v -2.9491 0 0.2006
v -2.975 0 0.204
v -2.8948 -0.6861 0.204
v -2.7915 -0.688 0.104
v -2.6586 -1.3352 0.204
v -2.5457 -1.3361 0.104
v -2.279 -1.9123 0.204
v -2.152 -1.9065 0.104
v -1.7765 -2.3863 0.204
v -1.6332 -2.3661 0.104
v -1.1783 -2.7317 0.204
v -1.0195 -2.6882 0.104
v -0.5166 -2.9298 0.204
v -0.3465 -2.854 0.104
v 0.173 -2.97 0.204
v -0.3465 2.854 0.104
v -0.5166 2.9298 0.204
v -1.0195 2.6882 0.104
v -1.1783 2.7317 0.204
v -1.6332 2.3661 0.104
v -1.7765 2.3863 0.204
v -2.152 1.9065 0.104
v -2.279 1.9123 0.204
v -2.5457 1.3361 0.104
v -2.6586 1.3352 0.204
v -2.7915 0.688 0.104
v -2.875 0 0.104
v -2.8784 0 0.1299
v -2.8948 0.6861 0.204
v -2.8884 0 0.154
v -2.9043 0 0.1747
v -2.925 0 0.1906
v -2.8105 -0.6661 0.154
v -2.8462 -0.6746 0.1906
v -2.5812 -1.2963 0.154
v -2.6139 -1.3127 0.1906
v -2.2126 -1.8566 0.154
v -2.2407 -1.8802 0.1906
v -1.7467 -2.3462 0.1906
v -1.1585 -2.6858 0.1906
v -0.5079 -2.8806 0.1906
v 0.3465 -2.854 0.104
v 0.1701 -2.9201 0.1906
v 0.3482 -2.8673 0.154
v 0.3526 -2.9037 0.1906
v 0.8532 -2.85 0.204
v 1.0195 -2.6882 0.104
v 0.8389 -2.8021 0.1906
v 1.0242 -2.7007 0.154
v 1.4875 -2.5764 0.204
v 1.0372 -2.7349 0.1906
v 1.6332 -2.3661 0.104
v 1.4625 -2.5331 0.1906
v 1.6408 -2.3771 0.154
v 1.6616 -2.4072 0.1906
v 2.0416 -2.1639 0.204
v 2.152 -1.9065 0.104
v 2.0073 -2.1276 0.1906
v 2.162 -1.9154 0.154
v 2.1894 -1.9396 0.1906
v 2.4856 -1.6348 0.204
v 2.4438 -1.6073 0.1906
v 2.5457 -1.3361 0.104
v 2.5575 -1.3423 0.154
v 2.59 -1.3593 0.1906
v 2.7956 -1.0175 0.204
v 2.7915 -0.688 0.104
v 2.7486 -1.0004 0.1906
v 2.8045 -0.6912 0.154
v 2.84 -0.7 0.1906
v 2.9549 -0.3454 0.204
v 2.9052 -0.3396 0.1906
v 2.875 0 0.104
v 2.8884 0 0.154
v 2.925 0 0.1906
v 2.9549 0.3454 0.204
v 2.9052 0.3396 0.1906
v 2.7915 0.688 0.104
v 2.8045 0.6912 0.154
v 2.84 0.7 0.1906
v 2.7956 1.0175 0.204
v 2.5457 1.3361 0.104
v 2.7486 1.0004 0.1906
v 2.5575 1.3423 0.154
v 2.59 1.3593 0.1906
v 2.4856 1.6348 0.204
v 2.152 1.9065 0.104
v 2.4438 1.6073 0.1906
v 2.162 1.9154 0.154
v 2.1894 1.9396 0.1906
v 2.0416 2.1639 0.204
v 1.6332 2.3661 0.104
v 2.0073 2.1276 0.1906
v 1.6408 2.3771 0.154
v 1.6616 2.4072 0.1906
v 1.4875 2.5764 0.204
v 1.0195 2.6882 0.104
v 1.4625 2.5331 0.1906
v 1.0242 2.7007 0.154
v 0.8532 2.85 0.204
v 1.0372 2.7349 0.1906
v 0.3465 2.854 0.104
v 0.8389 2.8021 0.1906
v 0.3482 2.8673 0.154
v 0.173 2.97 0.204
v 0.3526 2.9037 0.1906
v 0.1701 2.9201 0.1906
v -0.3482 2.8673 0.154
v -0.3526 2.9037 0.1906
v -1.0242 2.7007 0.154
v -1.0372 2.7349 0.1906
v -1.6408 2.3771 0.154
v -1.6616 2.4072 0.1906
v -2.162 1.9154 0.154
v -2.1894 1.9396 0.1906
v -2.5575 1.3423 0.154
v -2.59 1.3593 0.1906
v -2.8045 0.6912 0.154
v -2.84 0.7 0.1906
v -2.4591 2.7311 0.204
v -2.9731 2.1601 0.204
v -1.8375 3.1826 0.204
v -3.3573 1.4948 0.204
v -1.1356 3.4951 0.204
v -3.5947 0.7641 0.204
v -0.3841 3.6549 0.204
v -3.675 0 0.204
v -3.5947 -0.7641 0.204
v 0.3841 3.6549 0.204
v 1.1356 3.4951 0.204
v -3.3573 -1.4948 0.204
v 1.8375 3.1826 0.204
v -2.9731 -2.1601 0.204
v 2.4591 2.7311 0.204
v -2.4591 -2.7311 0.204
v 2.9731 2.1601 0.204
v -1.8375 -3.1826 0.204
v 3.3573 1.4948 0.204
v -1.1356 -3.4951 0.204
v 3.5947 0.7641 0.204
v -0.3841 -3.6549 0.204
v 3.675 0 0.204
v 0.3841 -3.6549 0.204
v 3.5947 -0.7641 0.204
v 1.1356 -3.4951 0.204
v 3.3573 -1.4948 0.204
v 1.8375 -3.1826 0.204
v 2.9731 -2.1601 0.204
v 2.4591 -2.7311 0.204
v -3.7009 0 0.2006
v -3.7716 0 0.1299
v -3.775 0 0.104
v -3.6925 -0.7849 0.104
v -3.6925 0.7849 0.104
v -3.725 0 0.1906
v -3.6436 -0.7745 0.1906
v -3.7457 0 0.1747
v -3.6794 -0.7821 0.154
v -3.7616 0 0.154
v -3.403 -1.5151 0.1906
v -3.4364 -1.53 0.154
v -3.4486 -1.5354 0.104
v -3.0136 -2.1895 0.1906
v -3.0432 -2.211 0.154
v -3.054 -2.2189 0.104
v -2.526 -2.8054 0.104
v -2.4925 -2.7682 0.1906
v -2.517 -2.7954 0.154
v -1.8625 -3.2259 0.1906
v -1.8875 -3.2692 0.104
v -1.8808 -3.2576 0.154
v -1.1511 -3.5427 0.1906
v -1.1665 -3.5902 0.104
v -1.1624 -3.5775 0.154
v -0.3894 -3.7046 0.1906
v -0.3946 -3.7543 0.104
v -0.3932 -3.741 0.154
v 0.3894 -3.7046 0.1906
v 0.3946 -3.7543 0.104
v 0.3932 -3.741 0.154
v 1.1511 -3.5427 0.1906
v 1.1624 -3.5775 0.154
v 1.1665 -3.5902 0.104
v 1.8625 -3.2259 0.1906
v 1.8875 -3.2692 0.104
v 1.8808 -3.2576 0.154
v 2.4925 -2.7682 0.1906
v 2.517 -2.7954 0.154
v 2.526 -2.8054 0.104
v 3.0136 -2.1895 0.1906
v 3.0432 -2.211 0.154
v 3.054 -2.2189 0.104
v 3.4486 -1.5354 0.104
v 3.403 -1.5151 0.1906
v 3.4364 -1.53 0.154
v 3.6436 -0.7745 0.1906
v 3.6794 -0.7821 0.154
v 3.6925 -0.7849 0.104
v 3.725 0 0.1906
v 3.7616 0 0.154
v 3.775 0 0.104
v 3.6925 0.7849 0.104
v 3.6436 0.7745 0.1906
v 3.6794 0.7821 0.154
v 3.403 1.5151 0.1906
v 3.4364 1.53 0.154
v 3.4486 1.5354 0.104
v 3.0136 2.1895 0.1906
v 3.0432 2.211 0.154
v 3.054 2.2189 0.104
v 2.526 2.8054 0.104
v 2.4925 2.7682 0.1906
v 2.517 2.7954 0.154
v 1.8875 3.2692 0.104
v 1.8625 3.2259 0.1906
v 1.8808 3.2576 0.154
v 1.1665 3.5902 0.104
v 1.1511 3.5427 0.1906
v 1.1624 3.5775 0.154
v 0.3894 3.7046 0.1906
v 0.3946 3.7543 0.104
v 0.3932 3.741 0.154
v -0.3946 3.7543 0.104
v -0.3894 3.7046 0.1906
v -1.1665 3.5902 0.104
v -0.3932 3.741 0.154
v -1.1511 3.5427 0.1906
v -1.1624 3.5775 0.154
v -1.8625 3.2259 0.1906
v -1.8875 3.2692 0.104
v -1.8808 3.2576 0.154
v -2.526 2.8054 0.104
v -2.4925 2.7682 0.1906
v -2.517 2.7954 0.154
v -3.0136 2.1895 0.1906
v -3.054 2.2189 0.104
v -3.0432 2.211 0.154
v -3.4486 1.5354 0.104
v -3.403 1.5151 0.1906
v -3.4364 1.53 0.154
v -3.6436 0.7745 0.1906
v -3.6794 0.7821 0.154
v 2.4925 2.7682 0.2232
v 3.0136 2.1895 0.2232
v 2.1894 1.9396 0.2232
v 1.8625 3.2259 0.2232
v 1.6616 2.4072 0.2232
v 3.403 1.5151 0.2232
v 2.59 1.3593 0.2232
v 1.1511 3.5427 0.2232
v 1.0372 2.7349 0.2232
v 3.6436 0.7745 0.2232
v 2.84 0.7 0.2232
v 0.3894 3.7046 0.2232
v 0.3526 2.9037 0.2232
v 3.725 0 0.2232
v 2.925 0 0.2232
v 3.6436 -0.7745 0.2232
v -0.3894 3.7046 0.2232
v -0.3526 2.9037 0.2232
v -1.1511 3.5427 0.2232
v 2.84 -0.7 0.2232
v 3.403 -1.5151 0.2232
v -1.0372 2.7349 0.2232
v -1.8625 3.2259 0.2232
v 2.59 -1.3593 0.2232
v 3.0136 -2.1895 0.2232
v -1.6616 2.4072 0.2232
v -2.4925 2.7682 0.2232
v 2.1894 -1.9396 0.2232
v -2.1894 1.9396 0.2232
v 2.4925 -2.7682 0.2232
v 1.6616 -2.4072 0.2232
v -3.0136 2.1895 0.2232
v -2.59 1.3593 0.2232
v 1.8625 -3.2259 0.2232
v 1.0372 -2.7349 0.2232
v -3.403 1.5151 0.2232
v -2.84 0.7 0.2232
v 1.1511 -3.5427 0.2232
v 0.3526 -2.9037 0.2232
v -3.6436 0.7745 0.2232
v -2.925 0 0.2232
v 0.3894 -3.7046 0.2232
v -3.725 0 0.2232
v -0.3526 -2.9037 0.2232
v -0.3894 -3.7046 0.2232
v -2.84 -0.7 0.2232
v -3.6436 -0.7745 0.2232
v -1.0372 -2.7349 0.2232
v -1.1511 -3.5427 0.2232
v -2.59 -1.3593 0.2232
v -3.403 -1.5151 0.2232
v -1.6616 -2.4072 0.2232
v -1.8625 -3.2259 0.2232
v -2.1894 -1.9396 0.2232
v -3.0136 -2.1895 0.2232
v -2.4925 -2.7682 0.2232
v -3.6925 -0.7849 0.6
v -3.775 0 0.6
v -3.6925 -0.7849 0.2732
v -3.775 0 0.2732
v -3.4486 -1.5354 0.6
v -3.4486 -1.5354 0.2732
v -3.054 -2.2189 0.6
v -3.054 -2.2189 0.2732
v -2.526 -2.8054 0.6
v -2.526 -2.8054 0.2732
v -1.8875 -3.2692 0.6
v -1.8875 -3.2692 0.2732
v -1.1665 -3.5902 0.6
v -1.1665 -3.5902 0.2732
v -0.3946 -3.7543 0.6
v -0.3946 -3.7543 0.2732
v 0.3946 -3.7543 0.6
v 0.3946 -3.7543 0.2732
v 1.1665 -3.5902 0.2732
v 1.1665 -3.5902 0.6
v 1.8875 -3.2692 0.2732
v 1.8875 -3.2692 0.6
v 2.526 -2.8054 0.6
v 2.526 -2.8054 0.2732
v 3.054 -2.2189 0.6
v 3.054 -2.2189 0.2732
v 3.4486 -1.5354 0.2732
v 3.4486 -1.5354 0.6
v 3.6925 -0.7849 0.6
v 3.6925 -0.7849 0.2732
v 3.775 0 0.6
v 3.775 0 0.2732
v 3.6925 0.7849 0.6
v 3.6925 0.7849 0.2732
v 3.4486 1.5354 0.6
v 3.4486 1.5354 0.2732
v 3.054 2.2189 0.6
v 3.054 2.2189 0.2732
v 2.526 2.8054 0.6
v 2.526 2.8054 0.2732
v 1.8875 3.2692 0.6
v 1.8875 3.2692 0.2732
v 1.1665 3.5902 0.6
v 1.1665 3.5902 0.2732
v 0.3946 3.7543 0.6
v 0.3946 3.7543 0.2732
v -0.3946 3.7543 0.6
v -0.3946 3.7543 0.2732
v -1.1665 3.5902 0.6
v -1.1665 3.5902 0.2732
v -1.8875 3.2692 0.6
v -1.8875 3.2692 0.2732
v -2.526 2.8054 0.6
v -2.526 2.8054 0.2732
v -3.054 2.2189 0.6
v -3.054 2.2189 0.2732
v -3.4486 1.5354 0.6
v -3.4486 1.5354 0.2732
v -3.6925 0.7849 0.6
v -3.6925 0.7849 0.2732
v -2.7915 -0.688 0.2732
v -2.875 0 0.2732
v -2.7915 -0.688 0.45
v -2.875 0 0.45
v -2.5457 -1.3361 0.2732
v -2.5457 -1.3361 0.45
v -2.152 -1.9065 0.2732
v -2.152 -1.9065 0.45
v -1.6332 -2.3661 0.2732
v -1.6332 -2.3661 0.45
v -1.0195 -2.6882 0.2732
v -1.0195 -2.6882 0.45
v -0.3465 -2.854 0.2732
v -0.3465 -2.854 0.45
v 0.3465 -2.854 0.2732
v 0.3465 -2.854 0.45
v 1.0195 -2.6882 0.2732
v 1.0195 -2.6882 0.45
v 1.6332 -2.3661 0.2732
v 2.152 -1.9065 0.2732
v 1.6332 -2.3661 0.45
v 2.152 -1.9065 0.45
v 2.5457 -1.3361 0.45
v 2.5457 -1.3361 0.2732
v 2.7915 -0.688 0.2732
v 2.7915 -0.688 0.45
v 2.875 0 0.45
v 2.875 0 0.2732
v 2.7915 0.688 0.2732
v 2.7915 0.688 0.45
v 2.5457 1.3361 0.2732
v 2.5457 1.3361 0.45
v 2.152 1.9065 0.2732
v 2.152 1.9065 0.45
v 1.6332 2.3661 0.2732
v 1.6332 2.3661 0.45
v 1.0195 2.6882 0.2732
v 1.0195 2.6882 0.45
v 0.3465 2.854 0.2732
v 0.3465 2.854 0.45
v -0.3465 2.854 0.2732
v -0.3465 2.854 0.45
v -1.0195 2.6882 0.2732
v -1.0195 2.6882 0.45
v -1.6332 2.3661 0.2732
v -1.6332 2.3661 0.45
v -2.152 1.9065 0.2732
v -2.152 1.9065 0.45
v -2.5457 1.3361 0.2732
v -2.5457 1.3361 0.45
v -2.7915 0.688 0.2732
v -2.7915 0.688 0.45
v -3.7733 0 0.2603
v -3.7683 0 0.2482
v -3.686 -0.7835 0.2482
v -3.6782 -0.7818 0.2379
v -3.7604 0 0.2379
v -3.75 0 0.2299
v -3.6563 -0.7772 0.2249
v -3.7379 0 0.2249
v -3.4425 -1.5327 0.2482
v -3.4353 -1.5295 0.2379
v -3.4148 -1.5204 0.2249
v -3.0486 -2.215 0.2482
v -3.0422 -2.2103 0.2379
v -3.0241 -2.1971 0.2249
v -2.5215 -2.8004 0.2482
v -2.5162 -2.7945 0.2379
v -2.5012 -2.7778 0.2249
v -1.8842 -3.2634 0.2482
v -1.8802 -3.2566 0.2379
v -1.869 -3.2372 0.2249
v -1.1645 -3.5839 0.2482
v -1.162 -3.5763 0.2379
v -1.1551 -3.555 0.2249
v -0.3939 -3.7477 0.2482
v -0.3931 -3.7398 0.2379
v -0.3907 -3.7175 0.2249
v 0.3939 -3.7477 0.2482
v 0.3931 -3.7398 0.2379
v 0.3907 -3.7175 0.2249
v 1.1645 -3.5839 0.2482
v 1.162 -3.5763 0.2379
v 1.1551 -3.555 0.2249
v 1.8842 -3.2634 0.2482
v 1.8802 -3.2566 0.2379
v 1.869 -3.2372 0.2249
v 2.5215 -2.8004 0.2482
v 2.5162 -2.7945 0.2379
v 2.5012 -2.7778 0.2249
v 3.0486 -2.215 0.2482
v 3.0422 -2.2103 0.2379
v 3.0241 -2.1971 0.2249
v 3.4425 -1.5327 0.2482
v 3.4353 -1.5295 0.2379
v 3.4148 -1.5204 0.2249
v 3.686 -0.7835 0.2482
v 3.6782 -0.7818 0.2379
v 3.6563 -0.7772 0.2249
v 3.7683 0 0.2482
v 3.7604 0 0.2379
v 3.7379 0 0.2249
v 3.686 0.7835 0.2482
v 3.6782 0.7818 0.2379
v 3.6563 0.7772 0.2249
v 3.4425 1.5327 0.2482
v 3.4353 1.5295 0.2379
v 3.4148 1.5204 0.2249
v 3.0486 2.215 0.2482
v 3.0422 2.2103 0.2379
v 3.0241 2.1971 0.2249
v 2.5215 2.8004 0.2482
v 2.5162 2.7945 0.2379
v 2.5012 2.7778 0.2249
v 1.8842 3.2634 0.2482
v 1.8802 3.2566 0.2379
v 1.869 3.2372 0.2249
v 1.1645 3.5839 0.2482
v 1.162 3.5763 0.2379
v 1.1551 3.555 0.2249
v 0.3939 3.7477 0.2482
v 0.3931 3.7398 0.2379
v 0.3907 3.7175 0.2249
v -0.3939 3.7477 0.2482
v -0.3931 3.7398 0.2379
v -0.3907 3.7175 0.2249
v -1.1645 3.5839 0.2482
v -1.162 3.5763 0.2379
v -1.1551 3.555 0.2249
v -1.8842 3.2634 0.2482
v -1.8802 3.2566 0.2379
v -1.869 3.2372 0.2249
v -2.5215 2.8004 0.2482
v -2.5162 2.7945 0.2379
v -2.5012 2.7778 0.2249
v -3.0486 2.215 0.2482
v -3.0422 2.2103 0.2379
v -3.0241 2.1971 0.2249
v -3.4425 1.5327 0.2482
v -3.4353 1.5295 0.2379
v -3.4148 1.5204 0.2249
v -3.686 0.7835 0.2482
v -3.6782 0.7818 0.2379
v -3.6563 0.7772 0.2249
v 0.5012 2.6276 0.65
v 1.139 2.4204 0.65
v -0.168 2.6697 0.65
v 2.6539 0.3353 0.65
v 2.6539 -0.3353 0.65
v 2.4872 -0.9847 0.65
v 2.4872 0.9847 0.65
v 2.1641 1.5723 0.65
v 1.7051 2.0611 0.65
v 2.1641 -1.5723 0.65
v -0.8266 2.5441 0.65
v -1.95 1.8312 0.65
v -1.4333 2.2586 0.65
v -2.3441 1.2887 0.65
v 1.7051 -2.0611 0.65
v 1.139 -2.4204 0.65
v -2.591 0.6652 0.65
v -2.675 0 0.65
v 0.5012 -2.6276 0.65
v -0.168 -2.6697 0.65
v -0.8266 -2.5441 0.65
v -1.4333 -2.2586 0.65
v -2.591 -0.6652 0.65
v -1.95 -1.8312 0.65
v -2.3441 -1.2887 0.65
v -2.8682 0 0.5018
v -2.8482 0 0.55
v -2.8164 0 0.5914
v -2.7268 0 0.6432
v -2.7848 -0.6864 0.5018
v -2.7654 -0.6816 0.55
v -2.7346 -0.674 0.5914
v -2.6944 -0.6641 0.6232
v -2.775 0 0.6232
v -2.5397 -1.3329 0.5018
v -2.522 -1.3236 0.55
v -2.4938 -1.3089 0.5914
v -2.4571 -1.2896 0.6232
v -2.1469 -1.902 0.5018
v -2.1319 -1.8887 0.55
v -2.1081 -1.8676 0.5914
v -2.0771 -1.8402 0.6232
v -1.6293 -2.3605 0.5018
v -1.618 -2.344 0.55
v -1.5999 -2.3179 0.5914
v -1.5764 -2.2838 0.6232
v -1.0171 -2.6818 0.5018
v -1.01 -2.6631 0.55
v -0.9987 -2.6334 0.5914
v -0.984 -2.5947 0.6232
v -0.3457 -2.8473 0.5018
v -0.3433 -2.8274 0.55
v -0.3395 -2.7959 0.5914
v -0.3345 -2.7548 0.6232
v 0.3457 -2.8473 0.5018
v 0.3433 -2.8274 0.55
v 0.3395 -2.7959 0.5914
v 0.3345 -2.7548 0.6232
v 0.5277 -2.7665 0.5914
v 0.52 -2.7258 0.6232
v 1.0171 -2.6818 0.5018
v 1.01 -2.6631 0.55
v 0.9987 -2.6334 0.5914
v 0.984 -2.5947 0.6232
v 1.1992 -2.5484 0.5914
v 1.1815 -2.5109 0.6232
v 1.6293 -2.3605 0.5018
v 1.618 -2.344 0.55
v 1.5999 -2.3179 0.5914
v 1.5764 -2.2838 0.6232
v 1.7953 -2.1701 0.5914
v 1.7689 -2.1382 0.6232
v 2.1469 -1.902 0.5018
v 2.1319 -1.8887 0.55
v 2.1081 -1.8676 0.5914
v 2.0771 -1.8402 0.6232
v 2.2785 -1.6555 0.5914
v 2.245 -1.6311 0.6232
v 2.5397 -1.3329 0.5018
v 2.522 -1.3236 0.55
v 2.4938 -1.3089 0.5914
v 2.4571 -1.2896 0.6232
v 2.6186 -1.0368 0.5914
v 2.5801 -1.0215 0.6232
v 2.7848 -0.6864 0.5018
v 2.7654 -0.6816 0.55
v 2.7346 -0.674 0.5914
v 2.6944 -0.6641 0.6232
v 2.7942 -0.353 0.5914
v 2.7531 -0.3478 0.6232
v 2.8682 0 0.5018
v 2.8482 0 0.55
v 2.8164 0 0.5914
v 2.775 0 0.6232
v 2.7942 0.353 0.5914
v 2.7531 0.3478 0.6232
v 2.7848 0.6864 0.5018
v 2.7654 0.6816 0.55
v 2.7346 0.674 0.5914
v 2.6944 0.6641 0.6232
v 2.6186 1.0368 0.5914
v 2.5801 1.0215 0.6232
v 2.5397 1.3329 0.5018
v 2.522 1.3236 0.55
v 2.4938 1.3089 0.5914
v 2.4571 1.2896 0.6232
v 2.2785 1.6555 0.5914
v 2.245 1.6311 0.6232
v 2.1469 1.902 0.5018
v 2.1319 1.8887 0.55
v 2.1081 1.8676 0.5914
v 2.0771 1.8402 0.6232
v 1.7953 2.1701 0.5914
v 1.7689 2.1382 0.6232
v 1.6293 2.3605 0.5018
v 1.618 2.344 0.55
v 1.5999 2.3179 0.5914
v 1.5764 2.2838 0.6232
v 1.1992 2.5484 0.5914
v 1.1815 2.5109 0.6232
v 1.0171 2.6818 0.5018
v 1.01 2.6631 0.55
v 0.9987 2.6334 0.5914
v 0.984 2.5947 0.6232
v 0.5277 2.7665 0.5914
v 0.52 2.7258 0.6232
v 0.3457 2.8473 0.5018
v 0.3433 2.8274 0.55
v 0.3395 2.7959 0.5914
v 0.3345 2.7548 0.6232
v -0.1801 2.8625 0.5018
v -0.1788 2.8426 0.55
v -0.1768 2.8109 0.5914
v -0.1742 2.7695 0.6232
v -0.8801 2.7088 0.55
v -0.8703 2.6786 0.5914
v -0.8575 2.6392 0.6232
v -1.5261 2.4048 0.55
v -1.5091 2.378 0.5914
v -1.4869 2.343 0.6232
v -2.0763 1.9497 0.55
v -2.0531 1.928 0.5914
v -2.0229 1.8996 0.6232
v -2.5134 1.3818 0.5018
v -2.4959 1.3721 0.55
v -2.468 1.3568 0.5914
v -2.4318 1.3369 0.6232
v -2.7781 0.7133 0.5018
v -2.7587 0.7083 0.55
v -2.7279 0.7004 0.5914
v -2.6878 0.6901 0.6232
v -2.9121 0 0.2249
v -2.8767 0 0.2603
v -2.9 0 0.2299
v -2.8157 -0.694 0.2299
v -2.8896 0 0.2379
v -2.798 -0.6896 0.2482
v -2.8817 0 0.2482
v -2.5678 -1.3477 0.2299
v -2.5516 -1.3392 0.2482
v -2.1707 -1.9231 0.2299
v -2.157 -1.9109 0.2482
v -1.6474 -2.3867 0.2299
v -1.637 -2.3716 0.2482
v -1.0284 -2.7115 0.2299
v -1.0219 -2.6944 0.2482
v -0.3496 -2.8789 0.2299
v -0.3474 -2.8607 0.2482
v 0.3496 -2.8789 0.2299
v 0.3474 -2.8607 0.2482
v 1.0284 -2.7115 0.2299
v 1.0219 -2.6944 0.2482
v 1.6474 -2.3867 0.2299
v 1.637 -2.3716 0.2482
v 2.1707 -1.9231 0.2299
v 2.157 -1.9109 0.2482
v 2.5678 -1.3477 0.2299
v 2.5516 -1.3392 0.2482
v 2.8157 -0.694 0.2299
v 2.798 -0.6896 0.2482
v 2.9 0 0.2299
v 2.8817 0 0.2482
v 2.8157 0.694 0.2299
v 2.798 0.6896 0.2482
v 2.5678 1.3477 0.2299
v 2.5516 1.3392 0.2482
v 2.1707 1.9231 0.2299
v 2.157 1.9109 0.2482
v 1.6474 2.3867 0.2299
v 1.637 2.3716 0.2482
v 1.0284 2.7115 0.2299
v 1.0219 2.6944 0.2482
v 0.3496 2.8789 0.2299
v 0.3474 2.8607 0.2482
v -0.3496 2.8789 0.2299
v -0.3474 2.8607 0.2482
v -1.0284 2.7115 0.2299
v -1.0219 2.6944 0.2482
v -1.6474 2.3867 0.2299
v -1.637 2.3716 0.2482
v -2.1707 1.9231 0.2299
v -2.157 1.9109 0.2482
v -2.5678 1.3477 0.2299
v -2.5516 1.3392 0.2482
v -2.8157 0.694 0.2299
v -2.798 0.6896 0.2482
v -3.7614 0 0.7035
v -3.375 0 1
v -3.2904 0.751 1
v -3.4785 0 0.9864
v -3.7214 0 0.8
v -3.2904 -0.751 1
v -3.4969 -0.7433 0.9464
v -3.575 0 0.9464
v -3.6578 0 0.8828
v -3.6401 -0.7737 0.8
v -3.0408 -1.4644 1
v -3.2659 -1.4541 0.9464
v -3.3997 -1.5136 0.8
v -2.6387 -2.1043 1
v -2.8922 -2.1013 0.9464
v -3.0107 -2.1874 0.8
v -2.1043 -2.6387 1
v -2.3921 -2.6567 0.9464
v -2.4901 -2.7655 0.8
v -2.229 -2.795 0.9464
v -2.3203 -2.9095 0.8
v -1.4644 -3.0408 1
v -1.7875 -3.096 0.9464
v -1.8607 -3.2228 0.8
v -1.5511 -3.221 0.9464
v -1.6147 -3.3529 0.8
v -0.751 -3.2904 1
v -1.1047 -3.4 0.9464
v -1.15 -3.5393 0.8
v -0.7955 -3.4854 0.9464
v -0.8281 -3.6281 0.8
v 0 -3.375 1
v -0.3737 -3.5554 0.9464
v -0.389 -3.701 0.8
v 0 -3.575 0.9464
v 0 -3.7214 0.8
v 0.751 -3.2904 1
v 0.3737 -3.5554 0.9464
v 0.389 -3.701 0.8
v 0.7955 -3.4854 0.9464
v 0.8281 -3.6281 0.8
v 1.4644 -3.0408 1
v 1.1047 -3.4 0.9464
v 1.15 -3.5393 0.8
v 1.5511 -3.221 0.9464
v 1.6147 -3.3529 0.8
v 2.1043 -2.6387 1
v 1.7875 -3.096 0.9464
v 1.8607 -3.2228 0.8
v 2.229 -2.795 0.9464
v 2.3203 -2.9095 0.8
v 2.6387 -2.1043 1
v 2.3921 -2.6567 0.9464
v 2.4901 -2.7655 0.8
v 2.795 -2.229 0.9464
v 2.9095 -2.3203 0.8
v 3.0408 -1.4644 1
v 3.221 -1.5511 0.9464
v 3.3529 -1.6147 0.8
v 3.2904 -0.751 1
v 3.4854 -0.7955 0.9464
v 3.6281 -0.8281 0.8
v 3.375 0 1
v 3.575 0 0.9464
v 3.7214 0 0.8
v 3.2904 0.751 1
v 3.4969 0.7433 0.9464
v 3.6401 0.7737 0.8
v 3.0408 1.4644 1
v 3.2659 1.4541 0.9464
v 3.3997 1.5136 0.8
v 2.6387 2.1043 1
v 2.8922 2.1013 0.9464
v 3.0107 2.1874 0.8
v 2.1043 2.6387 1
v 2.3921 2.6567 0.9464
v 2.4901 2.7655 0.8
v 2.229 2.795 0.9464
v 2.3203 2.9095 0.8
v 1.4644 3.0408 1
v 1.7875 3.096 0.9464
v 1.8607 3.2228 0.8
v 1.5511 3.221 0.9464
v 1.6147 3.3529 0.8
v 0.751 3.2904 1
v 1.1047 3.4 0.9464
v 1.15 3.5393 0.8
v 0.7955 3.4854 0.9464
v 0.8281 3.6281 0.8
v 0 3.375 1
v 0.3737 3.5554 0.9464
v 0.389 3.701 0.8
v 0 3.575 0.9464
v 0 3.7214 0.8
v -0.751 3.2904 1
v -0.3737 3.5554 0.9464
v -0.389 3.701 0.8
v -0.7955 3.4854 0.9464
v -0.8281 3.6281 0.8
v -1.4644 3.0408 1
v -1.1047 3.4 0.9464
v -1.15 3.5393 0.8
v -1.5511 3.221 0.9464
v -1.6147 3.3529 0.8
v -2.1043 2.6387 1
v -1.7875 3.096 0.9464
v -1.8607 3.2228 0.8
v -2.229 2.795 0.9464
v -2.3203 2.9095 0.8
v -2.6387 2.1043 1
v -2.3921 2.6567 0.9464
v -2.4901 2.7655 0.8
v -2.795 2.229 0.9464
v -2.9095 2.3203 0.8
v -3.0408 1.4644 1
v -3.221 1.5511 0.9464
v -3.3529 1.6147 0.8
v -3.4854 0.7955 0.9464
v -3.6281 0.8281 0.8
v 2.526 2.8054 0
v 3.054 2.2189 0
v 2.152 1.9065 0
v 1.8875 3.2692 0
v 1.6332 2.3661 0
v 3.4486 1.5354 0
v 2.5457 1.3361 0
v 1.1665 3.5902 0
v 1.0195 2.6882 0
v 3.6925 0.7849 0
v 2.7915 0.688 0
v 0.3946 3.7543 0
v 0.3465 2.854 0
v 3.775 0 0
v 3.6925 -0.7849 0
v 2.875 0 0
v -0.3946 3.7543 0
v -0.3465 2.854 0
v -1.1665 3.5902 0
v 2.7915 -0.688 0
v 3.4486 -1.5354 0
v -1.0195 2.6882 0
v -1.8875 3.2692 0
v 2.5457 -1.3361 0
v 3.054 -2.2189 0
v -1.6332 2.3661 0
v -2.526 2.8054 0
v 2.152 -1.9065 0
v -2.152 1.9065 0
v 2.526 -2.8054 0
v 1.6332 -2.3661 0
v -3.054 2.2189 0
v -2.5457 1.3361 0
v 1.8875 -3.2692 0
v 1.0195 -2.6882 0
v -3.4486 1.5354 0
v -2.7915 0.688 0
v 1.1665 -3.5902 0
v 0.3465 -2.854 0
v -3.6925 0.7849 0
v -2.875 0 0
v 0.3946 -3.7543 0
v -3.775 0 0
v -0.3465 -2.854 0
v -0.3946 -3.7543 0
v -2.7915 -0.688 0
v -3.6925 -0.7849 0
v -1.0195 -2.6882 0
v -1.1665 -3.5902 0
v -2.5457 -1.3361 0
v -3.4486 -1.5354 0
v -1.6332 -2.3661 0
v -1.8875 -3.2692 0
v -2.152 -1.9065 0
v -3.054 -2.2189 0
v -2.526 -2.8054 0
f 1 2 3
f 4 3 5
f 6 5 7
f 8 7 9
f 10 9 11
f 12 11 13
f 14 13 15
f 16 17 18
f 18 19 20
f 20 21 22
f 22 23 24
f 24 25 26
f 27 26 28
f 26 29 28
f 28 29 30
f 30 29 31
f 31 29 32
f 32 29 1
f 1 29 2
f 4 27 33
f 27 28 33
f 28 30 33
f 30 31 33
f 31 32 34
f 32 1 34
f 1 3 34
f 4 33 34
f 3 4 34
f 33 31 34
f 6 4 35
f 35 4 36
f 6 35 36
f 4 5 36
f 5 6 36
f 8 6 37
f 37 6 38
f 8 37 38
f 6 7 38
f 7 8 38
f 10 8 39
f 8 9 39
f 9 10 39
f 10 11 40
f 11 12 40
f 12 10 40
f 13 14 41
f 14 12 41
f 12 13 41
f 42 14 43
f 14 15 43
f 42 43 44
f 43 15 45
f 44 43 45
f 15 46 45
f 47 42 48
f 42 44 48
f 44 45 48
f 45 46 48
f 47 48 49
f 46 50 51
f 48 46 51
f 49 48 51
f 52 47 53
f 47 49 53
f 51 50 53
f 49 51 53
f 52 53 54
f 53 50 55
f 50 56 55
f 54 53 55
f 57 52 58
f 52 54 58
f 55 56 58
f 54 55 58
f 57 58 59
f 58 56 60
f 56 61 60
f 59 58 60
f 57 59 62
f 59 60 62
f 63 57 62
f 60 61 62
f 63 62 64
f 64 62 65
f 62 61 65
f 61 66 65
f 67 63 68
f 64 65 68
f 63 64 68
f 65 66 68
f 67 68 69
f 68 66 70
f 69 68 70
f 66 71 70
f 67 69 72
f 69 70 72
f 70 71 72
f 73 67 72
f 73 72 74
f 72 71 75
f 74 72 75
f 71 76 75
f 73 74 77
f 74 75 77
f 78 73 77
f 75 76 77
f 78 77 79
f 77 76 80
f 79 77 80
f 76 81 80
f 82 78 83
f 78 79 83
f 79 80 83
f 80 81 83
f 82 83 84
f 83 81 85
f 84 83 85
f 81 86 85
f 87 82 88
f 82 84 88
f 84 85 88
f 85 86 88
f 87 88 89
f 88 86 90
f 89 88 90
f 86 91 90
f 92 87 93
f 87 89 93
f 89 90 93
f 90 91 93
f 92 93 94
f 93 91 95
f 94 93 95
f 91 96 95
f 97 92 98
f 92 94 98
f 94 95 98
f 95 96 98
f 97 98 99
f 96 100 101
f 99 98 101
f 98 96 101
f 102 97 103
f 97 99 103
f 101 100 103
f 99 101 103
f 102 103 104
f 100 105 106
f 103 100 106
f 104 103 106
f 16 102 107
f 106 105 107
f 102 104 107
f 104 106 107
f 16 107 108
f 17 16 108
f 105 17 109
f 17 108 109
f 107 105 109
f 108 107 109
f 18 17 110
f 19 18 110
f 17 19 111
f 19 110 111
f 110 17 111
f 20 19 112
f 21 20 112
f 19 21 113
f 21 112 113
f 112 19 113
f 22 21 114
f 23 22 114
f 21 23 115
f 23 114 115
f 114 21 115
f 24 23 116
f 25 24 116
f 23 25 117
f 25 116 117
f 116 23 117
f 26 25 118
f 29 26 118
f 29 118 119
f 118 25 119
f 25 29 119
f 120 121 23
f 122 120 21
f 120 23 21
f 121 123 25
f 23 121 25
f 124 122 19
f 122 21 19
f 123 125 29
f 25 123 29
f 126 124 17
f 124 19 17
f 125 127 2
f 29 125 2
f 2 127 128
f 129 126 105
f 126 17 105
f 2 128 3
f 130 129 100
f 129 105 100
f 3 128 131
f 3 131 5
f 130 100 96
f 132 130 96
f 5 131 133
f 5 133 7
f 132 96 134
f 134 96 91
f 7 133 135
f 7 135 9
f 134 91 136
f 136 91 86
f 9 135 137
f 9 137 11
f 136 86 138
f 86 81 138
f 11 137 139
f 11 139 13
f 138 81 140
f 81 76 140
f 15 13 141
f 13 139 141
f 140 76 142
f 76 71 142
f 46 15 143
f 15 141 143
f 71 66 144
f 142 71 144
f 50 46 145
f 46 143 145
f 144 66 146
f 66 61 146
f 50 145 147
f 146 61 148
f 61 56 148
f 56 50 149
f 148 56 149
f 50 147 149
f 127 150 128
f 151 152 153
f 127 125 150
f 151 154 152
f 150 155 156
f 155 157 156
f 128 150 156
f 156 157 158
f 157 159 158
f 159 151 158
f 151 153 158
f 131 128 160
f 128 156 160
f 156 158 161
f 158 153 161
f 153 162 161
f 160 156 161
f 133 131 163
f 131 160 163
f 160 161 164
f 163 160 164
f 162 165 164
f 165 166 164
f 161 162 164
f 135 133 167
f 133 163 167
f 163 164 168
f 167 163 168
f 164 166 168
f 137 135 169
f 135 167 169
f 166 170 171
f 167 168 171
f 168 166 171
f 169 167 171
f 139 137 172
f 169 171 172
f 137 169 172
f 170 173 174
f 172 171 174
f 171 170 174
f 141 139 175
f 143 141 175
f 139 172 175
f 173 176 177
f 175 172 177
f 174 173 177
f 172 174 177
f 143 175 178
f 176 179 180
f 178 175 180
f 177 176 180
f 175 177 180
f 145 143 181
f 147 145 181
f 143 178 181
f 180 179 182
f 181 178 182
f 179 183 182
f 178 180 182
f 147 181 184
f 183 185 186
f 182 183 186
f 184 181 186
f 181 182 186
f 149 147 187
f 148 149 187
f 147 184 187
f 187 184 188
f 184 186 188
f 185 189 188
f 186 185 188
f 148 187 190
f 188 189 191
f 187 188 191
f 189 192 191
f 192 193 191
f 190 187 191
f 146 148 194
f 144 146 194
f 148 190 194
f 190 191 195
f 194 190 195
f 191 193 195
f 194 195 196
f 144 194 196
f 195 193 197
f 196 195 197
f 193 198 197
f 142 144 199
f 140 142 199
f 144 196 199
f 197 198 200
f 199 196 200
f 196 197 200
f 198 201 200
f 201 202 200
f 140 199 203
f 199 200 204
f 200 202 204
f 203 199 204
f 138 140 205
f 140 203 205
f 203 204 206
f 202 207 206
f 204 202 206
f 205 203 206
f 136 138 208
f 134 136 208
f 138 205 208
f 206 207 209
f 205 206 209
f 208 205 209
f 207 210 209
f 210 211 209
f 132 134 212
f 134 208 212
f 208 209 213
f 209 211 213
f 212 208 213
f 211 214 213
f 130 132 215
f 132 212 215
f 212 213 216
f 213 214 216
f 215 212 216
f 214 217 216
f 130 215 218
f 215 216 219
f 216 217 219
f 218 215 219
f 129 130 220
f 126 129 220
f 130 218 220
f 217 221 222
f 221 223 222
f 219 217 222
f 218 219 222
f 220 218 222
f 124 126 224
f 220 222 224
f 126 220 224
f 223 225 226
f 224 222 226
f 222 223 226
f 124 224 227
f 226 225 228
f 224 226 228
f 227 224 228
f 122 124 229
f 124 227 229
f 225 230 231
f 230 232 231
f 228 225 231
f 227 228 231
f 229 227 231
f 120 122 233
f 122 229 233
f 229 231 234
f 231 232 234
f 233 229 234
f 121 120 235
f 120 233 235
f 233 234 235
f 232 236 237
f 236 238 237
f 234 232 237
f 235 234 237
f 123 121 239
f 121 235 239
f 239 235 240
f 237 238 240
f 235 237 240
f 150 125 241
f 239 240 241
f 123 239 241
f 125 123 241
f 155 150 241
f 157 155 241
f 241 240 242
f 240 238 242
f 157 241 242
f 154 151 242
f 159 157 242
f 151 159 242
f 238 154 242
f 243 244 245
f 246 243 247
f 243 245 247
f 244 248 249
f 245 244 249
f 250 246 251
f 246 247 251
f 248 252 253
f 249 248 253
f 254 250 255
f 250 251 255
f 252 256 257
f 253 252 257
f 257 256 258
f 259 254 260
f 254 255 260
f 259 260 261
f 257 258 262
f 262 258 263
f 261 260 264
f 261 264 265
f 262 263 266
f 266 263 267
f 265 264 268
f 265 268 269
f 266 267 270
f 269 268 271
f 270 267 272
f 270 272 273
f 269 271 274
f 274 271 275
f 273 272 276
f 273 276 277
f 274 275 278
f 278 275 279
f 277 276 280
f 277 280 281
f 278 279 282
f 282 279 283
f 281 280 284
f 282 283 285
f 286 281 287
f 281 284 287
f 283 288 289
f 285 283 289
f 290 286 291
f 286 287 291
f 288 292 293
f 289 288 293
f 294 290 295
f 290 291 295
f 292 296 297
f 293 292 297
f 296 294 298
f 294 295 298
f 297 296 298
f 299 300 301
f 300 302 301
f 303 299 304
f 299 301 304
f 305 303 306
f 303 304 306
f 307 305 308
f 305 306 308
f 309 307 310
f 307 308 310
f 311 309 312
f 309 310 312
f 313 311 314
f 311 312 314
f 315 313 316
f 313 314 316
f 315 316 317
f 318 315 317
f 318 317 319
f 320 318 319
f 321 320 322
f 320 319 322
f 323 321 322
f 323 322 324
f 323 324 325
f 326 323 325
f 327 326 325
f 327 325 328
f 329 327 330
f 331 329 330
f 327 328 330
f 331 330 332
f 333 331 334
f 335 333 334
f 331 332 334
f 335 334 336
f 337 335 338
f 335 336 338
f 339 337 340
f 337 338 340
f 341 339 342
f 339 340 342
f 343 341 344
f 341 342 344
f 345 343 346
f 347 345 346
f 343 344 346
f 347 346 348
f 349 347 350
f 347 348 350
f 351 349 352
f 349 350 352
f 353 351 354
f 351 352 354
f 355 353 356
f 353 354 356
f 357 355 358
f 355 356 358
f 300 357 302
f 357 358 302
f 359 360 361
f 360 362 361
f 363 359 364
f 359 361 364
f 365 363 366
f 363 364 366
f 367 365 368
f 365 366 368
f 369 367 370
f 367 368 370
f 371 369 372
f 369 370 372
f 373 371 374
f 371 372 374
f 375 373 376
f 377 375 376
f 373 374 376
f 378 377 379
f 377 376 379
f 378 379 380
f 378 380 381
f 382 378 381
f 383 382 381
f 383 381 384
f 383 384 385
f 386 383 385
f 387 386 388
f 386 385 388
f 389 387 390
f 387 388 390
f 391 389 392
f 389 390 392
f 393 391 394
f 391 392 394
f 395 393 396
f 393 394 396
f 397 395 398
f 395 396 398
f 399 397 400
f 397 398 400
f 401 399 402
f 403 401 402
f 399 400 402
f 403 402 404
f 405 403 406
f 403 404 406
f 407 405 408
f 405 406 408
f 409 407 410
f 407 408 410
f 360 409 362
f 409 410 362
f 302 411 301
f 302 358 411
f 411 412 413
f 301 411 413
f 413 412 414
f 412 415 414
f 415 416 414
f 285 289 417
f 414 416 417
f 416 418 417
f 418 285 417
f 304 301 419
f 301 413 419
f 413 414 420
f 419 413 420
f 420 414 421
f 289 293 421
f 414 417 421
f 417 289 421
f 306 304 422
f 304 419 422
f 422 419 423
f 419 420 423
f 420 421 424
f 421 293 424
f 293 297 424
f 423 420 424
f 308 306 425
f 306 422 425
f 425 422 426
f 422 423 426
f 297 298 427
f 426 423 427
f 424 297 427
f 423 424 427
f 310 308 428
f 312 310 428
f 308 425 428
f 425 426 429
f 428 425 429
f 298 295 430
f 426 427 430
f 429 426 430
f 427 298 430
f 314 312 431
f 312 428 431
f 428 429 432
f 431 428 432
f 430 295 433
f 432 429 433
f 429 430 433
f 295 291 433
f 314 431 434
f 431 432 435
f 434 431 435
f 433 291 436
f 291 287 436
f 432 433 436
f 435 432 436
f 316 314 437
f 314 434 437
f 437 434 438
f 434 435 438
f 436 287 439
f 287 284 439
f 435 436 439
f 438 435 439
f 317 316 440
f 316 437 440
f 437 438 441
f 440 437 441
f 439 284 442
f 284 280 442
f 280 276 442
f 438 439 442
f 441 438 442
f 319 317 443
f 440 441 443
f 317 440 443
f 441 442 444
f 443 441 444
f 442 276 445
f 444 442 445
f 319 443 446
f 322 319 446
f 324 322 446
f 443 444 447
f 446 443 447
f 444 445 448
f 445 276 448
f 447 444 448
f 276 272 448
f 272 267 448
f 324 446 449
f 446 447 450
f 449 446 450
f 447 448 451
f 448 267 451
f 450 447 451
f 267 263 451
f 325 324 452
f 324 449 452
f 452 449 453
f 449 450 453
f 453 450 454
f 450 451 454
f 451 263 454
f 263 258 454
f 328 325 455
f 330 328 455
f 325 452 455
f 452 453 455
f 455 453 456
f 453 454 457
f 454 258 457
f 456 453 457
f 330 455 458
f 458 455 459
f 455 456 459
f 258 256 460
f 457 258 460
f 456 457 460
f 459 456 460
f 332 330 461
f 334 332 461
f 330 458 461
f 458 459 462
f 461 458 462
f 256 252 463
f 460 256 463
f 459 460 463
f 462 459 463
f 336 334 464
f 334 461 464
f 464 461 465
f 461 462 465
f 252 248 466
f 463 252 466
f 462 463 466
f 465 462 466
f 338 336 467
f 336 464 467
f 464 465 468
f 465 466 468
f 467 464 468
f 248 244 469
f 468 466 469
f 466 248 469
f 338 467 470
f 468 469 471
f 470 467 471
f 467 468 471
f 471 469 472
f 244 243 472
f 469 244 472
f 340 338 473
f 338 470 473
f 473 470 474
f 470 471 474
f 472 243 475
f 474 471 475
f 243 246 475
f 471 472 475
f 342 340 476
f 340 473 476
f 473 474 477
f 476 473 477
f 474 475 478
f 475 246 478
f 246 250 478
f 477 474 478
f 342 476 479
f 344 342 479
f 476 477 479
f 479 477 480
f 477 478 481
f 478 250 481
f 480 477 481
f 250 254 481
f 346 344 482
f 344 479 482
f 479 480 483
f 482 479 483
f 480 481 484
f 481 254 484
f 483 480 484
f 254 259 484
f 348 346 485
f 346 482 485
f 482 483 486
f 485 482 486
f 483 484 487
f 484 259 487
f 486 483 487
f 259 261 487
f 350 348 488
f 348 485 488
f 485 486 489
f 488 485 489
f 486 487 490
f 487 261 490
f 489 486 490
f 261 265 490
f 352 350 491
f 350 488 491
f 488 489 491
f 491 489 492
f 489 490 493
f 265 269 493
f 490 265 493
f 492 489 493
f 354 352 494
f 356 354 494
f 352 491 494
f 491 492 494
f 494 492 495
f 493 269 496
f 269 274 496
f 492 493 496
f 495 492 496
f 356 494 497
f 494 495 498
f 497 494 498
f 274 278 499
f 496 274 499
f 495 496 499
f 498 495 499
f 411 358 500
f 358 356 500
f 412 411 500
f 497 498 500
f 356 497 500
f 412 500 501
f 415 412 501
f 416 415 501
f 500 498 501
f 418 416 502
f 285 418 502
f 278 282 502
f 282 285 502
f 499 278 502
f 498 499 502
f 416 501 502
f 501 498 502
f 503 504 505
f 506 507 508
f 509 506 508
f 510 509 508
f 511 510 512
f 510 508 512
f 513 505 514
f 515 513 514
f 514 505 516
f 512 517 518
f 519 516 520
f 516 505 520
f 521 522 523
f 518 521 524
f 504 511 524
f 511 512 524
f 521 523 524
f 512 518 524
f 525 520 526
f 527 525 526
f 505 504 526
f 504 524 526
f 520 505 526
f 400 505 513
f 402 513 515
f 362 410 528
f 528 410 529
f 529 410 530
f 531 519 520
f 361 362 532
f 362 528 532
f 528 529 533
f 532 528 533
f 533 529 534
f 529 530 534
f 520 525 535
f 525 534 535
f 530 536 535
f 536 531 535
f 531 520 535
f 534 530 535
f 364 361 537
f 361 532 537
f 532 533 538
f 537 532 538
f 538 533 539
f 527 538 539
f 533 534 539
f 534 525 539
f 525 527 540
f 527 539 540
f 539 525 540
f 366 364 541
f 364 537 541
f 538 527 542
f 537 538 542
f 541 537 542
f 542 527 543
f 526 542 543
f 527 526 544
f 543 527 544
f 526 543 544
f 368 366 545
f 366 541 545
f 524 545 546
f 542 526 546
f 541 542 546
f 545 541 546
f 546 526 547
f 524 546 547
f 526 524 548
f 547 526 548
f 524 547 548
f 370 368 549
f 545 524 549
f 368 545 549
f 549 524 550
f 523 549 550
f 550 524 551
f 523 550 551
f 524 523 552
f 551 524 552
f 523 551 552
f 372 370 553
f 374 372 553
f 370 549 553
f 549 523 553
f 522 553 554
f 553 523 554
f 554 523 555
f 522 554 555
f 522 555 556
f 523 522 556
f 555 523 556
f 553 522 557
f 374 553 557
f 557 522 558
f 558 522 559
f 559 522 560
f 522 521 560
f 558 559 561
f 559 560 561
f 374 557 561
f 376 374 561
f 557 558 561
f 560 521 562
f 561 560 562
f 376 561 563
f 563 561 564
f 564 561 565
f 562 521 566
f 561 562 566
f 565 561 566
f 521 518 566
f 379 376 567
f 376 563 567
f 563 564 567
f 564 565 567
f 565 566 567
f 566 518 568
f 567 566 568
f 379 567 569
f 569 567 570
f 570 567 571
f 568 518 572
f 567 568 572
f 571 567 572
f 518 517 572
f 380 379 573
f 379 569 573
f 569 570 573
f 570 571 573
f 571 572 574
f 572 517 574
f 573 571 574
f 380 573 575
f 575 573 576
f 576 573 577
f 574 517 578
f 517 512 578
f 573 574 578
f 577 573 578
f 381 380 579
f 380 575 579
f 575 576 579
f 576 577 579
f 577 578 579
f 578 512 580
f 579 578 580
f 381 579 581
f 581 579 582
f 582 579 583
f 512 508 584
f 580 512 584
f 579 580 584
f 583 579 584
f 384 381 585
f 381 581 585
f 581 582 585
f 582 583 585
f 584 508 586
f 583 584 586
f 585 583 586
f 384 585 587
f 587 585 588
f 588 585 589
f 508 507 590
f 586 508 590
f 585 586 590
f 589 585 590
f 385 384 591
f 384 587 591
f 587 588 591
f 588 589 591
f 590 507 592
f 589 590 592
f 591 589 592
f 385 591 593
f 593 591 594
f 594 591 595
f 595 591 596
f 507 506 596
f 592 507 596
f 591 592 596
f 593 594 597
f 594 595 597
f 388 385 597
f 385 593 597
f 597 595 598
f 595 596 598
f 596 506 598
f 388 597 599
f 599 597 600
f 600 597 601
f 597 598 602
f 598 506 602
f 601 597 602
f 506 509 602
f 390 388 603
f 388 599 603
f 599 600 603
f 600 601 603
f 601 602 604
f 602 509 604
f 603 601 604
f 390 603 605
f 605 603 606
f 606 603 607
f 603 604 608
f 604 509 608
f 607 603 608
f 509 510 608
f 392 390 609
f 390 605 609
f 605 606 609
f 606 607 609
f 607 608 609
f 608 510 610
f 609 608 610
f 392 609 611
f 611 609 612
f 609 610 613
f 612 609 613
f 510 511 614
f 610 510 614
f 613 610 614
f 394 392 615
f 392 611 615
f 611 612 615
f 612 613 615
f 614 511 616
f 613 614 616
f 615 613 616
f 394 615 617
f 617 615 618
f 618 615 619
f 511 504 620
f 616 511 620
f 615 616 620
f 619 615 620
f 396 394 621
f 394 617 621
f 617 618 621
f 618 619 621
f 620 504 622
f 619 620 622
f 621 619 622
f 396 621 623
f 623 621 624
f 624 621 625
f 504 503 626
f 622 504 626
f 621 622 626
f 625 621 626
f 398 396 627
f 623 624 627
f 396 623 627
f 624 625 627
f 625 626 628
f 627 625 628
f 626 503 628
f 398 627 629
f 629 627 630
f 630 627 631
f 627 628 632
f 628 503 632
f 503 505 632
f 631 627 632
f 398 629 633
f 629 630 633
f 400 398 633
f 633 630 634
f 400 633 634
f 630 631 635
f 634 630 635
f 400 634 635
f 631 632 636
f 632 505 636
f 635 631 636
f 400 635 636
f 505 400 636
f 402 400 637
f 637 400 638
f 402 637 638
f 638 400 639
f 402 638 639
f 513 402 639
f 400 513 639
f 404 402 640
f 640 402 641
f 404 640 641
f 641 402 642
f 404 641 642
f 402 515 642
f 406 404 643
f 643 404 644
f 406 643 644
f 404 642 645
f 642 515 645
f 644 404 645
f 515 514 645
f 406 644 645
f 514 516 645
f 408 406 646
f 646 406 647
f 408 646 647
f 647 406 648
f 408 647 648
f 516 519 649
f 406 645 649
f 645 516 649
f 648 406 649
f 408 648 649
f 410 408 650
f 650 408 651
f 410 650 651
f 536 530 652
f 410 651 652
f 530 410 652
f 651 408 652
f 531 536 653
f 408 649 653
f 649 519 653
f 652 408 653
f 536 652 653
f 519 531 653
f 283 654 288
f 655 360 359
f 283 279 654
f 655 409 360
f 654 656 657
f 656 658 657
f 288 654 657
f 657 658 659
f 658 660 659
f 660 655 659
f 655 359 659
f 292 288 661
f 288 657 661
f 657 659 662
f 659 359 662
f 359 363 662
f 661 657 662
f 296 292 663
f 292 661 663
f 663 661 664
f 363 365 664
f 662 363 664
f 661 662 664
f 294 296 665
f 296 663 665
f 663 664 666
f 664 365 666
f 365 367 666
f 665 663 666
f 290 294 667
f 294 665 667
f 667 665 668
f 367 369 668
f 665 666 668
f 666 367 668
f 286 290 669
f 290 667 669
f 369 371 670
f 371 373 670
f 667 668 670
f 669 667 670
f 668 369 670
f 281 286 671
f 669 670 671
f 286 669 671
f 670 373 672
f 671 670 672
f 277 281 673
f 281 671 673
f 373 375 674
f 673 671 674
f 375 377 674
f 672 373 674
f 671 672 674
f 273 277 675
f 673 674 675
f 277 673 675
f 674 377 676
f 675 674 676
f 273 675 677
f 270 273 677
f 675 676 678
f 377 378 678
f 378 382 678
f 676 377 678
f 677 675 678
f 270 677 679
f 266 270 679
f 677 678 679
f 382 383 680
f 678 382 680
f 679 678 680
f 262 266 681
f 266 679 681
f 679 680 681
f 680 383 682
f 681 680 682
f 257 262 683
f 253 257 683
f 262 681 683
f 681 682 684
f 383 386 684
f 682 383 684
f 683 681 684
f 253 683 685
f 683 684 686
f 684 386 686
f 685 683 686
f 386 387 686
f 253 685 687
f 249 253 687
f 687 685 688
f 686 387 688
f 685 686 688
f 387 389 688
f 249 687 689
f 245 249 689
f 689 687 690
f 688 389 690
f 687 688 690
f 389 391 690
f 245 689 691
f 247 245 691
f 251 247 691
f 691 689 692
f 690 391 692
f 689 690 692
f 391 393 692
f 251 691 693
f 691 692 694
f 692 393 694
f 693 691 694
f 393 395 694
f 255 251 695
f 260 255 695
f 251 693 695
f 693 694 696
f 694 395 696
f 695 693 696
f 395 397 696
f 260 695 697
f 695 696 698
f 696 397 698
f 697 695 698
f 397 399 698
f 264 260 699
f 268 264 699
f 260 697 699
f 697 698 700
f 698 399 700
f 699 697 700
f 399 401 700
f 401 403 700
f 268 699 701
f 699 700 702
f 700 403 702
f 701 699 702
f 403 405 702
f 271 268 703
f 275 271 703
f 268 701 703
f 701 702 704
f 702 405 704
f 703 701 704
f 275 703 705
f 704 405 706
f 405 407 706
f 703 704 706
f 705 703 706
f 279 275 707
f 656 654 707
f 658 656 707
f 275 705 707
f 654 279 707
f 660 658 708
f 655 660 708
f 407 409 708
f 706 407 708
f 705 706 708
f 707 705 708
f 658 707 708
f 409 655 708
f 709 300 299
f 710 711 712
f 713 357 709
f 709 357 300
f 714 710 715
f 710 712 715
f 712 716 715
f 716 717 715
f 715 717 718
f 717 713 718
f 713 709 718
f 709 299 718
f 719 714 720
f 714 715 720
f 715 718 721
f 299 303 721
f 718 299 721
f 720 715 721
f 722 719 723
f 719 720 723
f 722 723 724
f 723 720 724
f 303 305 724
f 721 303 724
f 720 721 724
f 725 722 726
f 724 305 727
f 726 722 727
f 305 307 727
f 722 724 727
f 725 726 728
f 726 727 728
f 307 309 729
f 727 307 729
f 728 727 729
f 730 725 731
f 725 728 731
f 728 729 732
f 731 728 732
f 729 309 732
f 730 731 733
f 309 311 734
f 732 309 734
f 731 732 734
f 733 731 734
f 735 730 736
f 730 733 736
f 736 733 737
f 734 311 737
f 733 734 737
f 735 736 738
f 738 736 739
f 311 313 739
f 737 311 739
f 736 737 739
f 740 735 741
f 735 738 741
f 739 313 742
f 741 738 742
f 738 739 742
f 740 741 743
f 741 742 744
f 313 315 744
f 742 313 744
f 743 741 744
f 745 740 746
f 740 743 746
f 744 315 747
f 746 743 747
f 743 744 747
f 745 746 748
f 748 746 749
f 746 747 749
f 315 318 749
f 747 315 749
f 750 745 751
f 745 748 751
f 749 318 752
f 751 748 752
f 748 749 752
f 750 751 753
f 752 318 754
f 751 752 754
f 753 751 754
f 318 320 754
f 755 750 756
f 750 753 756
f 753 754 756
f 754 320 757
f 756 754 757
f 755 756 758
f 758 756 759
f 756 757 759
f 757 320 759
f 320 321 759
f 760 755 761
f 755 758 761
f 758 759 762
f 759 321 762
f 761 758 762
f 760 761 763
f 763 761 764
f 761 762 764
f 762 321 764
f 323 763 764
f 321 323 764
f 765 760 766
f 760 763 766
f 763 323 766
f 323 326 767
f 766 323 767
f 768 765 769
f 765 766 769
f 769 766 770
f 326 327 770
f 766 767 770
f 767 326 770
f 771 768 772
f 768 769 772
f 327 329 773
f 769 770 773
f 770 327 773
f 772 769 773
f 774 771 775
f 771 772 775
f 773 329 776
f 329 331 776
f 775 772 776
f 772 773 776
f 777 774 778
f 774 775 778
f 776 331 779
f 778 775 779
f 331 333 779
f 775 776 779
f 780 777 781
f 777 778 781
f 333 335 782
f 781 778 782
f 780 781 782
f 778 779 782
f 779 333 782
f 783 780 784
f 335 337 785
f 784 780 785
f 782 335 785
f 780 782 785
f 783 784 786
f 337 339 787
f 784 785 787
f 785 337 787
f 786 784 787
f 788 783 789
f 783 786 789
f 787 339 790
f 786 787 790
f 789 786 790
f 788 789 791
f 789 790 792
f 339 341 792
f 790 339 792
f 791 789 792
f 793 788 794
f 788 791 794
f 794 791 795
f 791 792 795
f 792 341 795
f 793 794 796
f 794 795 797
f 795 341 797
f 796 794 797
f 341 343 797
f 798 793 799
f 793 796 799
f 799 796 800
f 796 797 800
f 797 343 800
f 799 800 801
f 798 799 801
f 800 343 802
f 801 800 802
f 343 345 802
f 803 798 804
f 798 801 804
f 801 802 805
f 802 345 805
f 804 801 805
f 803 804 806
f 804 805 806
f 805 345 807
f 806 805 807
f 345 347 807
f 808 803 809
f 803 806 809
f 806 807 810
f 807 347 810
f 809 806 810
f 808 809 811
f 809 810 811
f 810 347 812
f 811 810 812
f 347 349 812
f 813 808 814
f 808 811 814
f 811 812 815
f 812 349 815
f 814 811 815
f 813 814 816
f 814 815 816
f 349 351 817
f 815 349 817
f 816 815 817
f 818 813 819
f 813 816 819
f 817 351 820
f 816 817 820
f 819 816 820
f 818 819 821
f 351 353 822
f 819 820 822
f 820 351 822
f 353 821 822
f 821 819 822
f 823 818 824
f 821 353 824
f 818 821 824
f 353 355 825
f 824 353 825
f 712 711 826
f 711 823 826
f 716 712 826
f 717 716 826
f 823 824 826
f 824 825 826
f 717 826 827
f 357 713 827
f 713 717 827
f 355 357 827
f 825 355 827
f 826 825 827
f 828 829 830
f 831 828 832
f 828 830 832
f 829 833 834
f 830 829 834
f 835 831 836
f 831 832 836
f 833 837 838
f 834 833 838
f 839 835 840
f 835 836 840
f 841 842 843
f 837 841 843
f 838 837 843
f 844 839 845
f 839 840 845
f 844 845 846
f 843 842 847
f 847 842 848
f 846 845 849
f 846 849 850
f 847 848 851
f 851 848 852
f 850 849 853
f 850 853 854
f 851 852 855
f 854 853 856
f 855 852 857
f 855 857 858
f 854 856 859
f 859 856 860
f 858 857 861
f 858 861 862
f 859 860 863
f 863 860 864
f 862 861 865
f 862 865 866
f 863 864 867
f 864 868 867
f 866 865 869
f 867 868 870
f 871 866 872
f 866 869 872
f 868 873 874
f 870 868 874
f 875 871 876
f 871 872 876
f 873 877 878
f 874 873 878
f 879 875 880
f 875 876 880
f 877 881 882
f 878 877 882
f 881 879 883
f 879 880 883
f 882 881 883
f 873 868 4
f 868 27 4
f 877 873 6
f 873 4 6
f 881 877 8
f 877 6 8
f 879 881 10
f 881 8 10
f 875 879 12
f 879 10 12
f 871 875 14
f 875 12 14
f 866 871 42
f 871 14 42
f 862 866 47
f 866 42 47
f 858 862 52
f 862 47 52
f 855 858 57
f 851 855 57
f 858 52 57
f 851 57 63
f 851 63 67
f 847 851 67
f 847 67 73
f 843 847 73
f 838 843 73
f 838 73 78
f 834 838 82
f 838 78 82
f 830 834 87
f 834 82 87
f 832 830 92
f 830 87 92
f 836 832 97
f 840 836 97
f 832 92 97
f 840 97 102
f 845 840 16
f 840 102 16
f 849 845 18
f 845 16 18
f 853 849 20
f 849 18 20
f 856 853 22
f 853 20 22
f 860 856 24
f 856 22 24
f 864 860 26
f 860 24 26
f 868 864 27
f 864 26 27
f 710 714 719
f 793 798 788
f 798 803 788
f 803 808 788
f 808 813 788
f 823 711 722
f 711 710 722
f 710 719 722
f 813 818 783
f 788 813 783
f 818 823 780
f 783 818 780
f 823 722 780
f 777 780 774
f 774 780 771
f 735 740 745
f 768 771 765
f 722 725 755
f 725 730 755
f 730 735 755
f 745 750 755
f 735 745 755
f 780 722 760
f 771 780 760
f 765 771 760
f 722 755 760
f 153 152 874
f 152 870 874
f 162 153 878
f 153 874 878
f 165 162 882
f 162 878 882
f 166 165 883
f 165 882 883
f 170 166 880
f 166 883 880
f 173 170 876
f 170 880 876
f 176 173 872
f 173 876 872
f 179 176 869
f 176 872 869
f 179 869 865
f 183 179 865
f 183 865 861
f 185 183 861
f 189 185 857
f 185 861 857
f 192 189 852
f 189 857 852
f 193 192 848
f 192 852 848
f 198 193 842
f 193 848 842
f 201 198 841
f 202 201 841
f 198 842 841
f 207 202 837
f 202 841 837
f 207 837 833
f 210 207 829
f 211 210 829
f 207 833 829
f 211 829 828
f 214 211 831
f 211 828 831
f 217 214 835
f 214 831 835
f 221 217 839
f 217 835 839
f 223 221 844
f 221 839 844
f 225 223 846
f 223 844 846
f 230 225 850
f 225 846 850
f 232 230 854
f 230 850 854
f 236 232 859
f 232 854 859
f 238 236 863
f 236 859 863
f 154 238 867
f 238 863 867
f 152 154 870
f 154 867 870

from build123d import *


with BuildPart() as f1:
    # F0 (on Front) → F1 (revolve)
    with BuildSketch(Plane.XZ):
        with BuildLine():
            Line((-2.675, 0.65), (0, 0.65))
            Line((0, 0.65), (0, 1))
            Line((0, 1), (-3.375, 1))
            ThreePointArc((-3.375, 1), (-3.657843, 0.882843), (-3.775, 0.6))
            Line((-3.775, 0.6), (-3.775, 0.273242))
            ThreePointArc((-3.775, 0.273242), (-3.760355, 0.237886), (-3.725, 0.223242))
            Line((-3.725, 0.223242), (-3.54468, 0.223242))
            ThreePointArc((-3.54468, 0.223242), (-3.509324, 0.237886), (-3.49468, 0.273242))
            Line((-3.49468, 0.273242), (-3.49468, 0.365176))
            ThreePointArc((-3.49468, 0.365176), (-3.497226, 0.380928), (-3.504604, 0.395076))
            Line((-3.504604, 0.395076), (-3.548599, 0.454043))
            ThreePointArc((-3.548599, 0.454043), (-3.555978, 0.468191), (-3.558524, 0.483943))
            Line((-3.558524, 0.483943), (-3.558524, 0.533437))
            ThreePointArc((-3.558524, 0.533437), (-3.556821, 0.546376), (-3.551828, 0.558432))
            Line((-3.551828, 0.558432), (-3.426828, 0.774995))
            ThreePointArc((-3.426828, 0.774995), (-3.408526, 0.7933), (-3.383524, 0.8))
            Line((-3.383524, 0.8), (-3.283524, 0.8))
            Line((-3.283524, 0.8), (-3.183524, 0.8))
            ThreePointArc((-3.183524, 0.8), (-3.158521, 0.7933), (-3.14022, 0.774995))
            Line((-3.14022, 0.774995), (-3.01522, 0.558432))
            ThreePointArc((-3.01522, 0.558432), (-3.010227, 0.546376), (-3.008524, 0.533437))
            Line((-3.008524, 0.533437), (-3.008524, 0.483943))
            ThreePointArc((-3.008524, 0.483943), (-3.01107, 0.468191), (-3.018449, 0.454043))
            Line((-3.018449, 0.454043), (-3.062443, 0.395076))
            ThreePointArc((-3.062443, 0.395076), (-3.069822, 0.380928), (-3.072368, 0.365176))
            Line((-3.072368, 0.365176), (-3.072368, 0.273242))
            ThreePointArc((-3.072368, 0.273242), (-3.057724, 0.237886), (-3.022368, 0.223242))
            Line((-3.022368, 0.223242), (-2.925, 0.223242))
            ThreePointArc((-2.925, 0.223242), (-2.889645, 0.237886), (-2.875, 0.273242))
            Line((-2.875, 0.273242), (-2.875, 0.45))
            ThreePointArc((-2.875, 0.45), (-2.816421, 0.591421), (-2.675, 0.65))
        make_face()
        with BuildLine():
            Line((-3.086763, 0.223242), (-3.022368, 0.223242))
            ThreePointArc((-3.022368, 0.223242), (-3.057724, 0.237886), (-3.072368, 0.273242))
            Line((-3.072368, 0.273242), (-3.072368, 0.365176))
            ThreePointArc((-3.072368, 0.365176), (-3.069822, 0.380928), (-3.062443, 0.395076))
            Line((-3.062443, 0.395076), (-3.018449, 0.454043))
            ThreePointArc((-3.018449, 0.454043), (-3.01107, 0.468191), (-3.008524, 0.483943))
            Line((-3.008524, 0.483943), (-3.008524, 0.533437))
            ThreePointArc((-3.008524, 0.533437), (-3.010227, 0.546376), (-3.01522, 0.558432))
            Line((-3.01522, 0.558432), (-3.14022, 0.774995))
            ThreePointArc((-3.14022, 0.774995), (-3.158521, 0.7933), (-3.183524, 0.8))
            Line((-3.183524, 0.8), (-3.283524, 0.8))
            Line((-3.283524, 0.8), (-3.383524, 0.8))
            ThreePointArc((-3.383524, 0.8), (-3.408526, 0.7933), (-3.426828, 0.774995))
            Line((-3.426828, 0.774995), (-3.551828, 0.558432))
            ThreePointArc((-3.551828, 0.558432), (-3.556821, 0.546376), (-3.558524, 0.533437))
            Line((-3.558524, 0.533437), (-3.558524, 0.483943))
            ThreePointArc((-3.558524, 0.483943), (-3.555978, 0.468191), (-3.548599, 0.454043))
            Line((-3.548599, 0.454043), (-3.504604, 0.395076))
            ThreePointArc((-3.504604, 0.395076), (-3.497226, 0.380928), (-3.49468, 0.365176))
            Line((-3.49468, 0.365176), (-3.49468, 0.273242))
            ThreePointArc((-3.49468, 0.273242), (-3.509324, 0.237886), (-3.54468, 0.223242))
            Line((-3.54468, 0.223242), (-3.480285, 0.223242))
            ThreePointArc((-3.480285, 0.223242), (-3.472405, 0.237749), (-3.46968, 0.254032))
            Line((-3.46968, 0.254032), (-3.46968, 0.365176))
            ThreePointArc((-3.46968, 0.365176), (-3.473499, 0.388804), (-3.484567, 0.410026))
            Line((-3.484567, 0.410026), (-3.528561, 0.468993))
            ThreePointArc((-3.528561, 0.468993), (-3.532251, 0.476067), (-3.533524, 0.483943))
            Line((-3.533524, 0.483943), (-3.533524, 0.533437))
            ThreePointArc((-3.533524, 0.533437), (-3.532672, 0.539906), (-3.530176, 0.545935))
            Line((-3.530176, 0.545935), (-3.405176, 0.762498))
            ThreePointArc((-3.405176, 0.762498), (-3.396025, 0.77165), (-3.383524, 0.775))
            Line((-3.383524, 0.775), (-3.308524, 0.775))
            Line((-3.308524, 0.775), (-3.183524, 0.775))
            ThreePointArc((-3.183524, 0.775), (-3.171023, 0.77165), (-3.161872, 0.762498))
            Line((-3.161872, 0.762498), (-3.036872, 0.545935))
            ThreePointArc((-3.036872, 0.545935), (-3.034375, 0.539906), (-3.033524, 0.533437))
            Line((-3.033524, 0.533437), (-3.033524, 0.483943))
            ThreePointArc((-3.033524, 0.483943), (-3.034797, 0.476067), (-3.038486, 0.468993))
            Line((-3.038486, 0.468993), (-3.082481, 0.410026))
            ThreePointArc((-3.082481, 0.410026), (-3.093549, 0.388804), (-3.097368, 0.365176))
            Line((-3.097368, 0.365176), (-3.097368, 0.254032))
            ThreePointArc((-3.097368, 0.254032), (-3.094643, 0.237749), (-3.086763, 0.223242))
        make_face()
        with BuildLine():
            Line((-3.480285, 0.223242), (-3.086763, 0.223242))
            ThreePointArc((-3.086763, 0.223242), (-3.094643, 0.237749), (-3.097368, 0.254032))
            Line((-3.097368, 0.254032), (-3.097368, 0.365176))
            ThreePointArc((-3.097368, 0.365176), (-3.093549, 0.388804), (-3.082481, 0.410026))
            Line((-3.082481, 0.410026), (-3.038486, 0.468993))
            ThreePointArc((-3.038486, 0.468993), (-3.034797, 0.476067), (-3.033524, 0.483943))
            Line((-3.033524, 0.483943), (-3.033524, 0.533437))
            ThreePointArc((-3.033524, 0.533437), (-3.034375, 0.539906), (-3.036872, 0.545935))
            Line((-3.036872, 0.545935), (-3.161872, 0.762498))
            ThreePointArc((-3.161872, 0.762498), (-3.171023, 0.77165), (-3.183524, 0.775))
            Line((-3.183524, 0.775), (-3.308524, 0.775))
            Line((-3.308524, 0.775), (-3.383524, 0.775))
            ThreePointArc((-3.383524, 0.775), (-3.396025, 0.77165), (-3.405176, 0.762498))
            Line((-3.405176, 0.762498), (-3.530176, 0.545935))
            ThreePointArc((-3.530176, 0.545935), (-3.532672, 0.539906), (-3.533524, 0.533437))
            Line((-3.533524, 0.533437), (-3.533524, 0.483943))
            ThreePointArc((-3.533524, 0.483943), (-3.532251, 0.476067), (-3.528561, 0.468993))
            Line((-3.528561, 0.468993), (-3.484567, 0.410026))
            ThreePointArc((-3.484567, 0.410026), (-3.473499, 0.388804), (-3.46968, 0.365176))
            Line((-3.46968, 0.365176), (-3.46968, 0.254032))
            ThreePointArc((-3.46968, 0.254032), (-3.472405, 0.237749), (-3.480285, 0.223242))
        make_face()
        with BuildLine():
            Line((-2.975, 0.204032), (-3.047368, 0.204032))
            Line((-3.047368, 0.204032), (-3.097368, 0.204032))
            Line((-3.097368, 0.204032), (-3.46968, 0.204032))
            Line((-3.46968, 0.204032), (-3.51968, 0.204032))
            Line((-3.51968, 0.204032), (-3.675, 0.204032))
            ThreePointArc((-3.675, 0.204032), (-3.745711, 0.174743), (-3.775, 0.104032))
            Line((-3.775, 0.104032), (-3.775, 0))
            Line((-3.775, 0), (-2.875, 0))
            Line((-2.875, 0), (-2.875, 0.104032))
            ThreePointArc((-2.875, 0.104032), (-2.904289, 0.174743), (-2.975, 0.204032))
        make_face()
    revolve(axis=Axis((0, 0, 0.5), (0, 0, 1)))


solid = f1.part
